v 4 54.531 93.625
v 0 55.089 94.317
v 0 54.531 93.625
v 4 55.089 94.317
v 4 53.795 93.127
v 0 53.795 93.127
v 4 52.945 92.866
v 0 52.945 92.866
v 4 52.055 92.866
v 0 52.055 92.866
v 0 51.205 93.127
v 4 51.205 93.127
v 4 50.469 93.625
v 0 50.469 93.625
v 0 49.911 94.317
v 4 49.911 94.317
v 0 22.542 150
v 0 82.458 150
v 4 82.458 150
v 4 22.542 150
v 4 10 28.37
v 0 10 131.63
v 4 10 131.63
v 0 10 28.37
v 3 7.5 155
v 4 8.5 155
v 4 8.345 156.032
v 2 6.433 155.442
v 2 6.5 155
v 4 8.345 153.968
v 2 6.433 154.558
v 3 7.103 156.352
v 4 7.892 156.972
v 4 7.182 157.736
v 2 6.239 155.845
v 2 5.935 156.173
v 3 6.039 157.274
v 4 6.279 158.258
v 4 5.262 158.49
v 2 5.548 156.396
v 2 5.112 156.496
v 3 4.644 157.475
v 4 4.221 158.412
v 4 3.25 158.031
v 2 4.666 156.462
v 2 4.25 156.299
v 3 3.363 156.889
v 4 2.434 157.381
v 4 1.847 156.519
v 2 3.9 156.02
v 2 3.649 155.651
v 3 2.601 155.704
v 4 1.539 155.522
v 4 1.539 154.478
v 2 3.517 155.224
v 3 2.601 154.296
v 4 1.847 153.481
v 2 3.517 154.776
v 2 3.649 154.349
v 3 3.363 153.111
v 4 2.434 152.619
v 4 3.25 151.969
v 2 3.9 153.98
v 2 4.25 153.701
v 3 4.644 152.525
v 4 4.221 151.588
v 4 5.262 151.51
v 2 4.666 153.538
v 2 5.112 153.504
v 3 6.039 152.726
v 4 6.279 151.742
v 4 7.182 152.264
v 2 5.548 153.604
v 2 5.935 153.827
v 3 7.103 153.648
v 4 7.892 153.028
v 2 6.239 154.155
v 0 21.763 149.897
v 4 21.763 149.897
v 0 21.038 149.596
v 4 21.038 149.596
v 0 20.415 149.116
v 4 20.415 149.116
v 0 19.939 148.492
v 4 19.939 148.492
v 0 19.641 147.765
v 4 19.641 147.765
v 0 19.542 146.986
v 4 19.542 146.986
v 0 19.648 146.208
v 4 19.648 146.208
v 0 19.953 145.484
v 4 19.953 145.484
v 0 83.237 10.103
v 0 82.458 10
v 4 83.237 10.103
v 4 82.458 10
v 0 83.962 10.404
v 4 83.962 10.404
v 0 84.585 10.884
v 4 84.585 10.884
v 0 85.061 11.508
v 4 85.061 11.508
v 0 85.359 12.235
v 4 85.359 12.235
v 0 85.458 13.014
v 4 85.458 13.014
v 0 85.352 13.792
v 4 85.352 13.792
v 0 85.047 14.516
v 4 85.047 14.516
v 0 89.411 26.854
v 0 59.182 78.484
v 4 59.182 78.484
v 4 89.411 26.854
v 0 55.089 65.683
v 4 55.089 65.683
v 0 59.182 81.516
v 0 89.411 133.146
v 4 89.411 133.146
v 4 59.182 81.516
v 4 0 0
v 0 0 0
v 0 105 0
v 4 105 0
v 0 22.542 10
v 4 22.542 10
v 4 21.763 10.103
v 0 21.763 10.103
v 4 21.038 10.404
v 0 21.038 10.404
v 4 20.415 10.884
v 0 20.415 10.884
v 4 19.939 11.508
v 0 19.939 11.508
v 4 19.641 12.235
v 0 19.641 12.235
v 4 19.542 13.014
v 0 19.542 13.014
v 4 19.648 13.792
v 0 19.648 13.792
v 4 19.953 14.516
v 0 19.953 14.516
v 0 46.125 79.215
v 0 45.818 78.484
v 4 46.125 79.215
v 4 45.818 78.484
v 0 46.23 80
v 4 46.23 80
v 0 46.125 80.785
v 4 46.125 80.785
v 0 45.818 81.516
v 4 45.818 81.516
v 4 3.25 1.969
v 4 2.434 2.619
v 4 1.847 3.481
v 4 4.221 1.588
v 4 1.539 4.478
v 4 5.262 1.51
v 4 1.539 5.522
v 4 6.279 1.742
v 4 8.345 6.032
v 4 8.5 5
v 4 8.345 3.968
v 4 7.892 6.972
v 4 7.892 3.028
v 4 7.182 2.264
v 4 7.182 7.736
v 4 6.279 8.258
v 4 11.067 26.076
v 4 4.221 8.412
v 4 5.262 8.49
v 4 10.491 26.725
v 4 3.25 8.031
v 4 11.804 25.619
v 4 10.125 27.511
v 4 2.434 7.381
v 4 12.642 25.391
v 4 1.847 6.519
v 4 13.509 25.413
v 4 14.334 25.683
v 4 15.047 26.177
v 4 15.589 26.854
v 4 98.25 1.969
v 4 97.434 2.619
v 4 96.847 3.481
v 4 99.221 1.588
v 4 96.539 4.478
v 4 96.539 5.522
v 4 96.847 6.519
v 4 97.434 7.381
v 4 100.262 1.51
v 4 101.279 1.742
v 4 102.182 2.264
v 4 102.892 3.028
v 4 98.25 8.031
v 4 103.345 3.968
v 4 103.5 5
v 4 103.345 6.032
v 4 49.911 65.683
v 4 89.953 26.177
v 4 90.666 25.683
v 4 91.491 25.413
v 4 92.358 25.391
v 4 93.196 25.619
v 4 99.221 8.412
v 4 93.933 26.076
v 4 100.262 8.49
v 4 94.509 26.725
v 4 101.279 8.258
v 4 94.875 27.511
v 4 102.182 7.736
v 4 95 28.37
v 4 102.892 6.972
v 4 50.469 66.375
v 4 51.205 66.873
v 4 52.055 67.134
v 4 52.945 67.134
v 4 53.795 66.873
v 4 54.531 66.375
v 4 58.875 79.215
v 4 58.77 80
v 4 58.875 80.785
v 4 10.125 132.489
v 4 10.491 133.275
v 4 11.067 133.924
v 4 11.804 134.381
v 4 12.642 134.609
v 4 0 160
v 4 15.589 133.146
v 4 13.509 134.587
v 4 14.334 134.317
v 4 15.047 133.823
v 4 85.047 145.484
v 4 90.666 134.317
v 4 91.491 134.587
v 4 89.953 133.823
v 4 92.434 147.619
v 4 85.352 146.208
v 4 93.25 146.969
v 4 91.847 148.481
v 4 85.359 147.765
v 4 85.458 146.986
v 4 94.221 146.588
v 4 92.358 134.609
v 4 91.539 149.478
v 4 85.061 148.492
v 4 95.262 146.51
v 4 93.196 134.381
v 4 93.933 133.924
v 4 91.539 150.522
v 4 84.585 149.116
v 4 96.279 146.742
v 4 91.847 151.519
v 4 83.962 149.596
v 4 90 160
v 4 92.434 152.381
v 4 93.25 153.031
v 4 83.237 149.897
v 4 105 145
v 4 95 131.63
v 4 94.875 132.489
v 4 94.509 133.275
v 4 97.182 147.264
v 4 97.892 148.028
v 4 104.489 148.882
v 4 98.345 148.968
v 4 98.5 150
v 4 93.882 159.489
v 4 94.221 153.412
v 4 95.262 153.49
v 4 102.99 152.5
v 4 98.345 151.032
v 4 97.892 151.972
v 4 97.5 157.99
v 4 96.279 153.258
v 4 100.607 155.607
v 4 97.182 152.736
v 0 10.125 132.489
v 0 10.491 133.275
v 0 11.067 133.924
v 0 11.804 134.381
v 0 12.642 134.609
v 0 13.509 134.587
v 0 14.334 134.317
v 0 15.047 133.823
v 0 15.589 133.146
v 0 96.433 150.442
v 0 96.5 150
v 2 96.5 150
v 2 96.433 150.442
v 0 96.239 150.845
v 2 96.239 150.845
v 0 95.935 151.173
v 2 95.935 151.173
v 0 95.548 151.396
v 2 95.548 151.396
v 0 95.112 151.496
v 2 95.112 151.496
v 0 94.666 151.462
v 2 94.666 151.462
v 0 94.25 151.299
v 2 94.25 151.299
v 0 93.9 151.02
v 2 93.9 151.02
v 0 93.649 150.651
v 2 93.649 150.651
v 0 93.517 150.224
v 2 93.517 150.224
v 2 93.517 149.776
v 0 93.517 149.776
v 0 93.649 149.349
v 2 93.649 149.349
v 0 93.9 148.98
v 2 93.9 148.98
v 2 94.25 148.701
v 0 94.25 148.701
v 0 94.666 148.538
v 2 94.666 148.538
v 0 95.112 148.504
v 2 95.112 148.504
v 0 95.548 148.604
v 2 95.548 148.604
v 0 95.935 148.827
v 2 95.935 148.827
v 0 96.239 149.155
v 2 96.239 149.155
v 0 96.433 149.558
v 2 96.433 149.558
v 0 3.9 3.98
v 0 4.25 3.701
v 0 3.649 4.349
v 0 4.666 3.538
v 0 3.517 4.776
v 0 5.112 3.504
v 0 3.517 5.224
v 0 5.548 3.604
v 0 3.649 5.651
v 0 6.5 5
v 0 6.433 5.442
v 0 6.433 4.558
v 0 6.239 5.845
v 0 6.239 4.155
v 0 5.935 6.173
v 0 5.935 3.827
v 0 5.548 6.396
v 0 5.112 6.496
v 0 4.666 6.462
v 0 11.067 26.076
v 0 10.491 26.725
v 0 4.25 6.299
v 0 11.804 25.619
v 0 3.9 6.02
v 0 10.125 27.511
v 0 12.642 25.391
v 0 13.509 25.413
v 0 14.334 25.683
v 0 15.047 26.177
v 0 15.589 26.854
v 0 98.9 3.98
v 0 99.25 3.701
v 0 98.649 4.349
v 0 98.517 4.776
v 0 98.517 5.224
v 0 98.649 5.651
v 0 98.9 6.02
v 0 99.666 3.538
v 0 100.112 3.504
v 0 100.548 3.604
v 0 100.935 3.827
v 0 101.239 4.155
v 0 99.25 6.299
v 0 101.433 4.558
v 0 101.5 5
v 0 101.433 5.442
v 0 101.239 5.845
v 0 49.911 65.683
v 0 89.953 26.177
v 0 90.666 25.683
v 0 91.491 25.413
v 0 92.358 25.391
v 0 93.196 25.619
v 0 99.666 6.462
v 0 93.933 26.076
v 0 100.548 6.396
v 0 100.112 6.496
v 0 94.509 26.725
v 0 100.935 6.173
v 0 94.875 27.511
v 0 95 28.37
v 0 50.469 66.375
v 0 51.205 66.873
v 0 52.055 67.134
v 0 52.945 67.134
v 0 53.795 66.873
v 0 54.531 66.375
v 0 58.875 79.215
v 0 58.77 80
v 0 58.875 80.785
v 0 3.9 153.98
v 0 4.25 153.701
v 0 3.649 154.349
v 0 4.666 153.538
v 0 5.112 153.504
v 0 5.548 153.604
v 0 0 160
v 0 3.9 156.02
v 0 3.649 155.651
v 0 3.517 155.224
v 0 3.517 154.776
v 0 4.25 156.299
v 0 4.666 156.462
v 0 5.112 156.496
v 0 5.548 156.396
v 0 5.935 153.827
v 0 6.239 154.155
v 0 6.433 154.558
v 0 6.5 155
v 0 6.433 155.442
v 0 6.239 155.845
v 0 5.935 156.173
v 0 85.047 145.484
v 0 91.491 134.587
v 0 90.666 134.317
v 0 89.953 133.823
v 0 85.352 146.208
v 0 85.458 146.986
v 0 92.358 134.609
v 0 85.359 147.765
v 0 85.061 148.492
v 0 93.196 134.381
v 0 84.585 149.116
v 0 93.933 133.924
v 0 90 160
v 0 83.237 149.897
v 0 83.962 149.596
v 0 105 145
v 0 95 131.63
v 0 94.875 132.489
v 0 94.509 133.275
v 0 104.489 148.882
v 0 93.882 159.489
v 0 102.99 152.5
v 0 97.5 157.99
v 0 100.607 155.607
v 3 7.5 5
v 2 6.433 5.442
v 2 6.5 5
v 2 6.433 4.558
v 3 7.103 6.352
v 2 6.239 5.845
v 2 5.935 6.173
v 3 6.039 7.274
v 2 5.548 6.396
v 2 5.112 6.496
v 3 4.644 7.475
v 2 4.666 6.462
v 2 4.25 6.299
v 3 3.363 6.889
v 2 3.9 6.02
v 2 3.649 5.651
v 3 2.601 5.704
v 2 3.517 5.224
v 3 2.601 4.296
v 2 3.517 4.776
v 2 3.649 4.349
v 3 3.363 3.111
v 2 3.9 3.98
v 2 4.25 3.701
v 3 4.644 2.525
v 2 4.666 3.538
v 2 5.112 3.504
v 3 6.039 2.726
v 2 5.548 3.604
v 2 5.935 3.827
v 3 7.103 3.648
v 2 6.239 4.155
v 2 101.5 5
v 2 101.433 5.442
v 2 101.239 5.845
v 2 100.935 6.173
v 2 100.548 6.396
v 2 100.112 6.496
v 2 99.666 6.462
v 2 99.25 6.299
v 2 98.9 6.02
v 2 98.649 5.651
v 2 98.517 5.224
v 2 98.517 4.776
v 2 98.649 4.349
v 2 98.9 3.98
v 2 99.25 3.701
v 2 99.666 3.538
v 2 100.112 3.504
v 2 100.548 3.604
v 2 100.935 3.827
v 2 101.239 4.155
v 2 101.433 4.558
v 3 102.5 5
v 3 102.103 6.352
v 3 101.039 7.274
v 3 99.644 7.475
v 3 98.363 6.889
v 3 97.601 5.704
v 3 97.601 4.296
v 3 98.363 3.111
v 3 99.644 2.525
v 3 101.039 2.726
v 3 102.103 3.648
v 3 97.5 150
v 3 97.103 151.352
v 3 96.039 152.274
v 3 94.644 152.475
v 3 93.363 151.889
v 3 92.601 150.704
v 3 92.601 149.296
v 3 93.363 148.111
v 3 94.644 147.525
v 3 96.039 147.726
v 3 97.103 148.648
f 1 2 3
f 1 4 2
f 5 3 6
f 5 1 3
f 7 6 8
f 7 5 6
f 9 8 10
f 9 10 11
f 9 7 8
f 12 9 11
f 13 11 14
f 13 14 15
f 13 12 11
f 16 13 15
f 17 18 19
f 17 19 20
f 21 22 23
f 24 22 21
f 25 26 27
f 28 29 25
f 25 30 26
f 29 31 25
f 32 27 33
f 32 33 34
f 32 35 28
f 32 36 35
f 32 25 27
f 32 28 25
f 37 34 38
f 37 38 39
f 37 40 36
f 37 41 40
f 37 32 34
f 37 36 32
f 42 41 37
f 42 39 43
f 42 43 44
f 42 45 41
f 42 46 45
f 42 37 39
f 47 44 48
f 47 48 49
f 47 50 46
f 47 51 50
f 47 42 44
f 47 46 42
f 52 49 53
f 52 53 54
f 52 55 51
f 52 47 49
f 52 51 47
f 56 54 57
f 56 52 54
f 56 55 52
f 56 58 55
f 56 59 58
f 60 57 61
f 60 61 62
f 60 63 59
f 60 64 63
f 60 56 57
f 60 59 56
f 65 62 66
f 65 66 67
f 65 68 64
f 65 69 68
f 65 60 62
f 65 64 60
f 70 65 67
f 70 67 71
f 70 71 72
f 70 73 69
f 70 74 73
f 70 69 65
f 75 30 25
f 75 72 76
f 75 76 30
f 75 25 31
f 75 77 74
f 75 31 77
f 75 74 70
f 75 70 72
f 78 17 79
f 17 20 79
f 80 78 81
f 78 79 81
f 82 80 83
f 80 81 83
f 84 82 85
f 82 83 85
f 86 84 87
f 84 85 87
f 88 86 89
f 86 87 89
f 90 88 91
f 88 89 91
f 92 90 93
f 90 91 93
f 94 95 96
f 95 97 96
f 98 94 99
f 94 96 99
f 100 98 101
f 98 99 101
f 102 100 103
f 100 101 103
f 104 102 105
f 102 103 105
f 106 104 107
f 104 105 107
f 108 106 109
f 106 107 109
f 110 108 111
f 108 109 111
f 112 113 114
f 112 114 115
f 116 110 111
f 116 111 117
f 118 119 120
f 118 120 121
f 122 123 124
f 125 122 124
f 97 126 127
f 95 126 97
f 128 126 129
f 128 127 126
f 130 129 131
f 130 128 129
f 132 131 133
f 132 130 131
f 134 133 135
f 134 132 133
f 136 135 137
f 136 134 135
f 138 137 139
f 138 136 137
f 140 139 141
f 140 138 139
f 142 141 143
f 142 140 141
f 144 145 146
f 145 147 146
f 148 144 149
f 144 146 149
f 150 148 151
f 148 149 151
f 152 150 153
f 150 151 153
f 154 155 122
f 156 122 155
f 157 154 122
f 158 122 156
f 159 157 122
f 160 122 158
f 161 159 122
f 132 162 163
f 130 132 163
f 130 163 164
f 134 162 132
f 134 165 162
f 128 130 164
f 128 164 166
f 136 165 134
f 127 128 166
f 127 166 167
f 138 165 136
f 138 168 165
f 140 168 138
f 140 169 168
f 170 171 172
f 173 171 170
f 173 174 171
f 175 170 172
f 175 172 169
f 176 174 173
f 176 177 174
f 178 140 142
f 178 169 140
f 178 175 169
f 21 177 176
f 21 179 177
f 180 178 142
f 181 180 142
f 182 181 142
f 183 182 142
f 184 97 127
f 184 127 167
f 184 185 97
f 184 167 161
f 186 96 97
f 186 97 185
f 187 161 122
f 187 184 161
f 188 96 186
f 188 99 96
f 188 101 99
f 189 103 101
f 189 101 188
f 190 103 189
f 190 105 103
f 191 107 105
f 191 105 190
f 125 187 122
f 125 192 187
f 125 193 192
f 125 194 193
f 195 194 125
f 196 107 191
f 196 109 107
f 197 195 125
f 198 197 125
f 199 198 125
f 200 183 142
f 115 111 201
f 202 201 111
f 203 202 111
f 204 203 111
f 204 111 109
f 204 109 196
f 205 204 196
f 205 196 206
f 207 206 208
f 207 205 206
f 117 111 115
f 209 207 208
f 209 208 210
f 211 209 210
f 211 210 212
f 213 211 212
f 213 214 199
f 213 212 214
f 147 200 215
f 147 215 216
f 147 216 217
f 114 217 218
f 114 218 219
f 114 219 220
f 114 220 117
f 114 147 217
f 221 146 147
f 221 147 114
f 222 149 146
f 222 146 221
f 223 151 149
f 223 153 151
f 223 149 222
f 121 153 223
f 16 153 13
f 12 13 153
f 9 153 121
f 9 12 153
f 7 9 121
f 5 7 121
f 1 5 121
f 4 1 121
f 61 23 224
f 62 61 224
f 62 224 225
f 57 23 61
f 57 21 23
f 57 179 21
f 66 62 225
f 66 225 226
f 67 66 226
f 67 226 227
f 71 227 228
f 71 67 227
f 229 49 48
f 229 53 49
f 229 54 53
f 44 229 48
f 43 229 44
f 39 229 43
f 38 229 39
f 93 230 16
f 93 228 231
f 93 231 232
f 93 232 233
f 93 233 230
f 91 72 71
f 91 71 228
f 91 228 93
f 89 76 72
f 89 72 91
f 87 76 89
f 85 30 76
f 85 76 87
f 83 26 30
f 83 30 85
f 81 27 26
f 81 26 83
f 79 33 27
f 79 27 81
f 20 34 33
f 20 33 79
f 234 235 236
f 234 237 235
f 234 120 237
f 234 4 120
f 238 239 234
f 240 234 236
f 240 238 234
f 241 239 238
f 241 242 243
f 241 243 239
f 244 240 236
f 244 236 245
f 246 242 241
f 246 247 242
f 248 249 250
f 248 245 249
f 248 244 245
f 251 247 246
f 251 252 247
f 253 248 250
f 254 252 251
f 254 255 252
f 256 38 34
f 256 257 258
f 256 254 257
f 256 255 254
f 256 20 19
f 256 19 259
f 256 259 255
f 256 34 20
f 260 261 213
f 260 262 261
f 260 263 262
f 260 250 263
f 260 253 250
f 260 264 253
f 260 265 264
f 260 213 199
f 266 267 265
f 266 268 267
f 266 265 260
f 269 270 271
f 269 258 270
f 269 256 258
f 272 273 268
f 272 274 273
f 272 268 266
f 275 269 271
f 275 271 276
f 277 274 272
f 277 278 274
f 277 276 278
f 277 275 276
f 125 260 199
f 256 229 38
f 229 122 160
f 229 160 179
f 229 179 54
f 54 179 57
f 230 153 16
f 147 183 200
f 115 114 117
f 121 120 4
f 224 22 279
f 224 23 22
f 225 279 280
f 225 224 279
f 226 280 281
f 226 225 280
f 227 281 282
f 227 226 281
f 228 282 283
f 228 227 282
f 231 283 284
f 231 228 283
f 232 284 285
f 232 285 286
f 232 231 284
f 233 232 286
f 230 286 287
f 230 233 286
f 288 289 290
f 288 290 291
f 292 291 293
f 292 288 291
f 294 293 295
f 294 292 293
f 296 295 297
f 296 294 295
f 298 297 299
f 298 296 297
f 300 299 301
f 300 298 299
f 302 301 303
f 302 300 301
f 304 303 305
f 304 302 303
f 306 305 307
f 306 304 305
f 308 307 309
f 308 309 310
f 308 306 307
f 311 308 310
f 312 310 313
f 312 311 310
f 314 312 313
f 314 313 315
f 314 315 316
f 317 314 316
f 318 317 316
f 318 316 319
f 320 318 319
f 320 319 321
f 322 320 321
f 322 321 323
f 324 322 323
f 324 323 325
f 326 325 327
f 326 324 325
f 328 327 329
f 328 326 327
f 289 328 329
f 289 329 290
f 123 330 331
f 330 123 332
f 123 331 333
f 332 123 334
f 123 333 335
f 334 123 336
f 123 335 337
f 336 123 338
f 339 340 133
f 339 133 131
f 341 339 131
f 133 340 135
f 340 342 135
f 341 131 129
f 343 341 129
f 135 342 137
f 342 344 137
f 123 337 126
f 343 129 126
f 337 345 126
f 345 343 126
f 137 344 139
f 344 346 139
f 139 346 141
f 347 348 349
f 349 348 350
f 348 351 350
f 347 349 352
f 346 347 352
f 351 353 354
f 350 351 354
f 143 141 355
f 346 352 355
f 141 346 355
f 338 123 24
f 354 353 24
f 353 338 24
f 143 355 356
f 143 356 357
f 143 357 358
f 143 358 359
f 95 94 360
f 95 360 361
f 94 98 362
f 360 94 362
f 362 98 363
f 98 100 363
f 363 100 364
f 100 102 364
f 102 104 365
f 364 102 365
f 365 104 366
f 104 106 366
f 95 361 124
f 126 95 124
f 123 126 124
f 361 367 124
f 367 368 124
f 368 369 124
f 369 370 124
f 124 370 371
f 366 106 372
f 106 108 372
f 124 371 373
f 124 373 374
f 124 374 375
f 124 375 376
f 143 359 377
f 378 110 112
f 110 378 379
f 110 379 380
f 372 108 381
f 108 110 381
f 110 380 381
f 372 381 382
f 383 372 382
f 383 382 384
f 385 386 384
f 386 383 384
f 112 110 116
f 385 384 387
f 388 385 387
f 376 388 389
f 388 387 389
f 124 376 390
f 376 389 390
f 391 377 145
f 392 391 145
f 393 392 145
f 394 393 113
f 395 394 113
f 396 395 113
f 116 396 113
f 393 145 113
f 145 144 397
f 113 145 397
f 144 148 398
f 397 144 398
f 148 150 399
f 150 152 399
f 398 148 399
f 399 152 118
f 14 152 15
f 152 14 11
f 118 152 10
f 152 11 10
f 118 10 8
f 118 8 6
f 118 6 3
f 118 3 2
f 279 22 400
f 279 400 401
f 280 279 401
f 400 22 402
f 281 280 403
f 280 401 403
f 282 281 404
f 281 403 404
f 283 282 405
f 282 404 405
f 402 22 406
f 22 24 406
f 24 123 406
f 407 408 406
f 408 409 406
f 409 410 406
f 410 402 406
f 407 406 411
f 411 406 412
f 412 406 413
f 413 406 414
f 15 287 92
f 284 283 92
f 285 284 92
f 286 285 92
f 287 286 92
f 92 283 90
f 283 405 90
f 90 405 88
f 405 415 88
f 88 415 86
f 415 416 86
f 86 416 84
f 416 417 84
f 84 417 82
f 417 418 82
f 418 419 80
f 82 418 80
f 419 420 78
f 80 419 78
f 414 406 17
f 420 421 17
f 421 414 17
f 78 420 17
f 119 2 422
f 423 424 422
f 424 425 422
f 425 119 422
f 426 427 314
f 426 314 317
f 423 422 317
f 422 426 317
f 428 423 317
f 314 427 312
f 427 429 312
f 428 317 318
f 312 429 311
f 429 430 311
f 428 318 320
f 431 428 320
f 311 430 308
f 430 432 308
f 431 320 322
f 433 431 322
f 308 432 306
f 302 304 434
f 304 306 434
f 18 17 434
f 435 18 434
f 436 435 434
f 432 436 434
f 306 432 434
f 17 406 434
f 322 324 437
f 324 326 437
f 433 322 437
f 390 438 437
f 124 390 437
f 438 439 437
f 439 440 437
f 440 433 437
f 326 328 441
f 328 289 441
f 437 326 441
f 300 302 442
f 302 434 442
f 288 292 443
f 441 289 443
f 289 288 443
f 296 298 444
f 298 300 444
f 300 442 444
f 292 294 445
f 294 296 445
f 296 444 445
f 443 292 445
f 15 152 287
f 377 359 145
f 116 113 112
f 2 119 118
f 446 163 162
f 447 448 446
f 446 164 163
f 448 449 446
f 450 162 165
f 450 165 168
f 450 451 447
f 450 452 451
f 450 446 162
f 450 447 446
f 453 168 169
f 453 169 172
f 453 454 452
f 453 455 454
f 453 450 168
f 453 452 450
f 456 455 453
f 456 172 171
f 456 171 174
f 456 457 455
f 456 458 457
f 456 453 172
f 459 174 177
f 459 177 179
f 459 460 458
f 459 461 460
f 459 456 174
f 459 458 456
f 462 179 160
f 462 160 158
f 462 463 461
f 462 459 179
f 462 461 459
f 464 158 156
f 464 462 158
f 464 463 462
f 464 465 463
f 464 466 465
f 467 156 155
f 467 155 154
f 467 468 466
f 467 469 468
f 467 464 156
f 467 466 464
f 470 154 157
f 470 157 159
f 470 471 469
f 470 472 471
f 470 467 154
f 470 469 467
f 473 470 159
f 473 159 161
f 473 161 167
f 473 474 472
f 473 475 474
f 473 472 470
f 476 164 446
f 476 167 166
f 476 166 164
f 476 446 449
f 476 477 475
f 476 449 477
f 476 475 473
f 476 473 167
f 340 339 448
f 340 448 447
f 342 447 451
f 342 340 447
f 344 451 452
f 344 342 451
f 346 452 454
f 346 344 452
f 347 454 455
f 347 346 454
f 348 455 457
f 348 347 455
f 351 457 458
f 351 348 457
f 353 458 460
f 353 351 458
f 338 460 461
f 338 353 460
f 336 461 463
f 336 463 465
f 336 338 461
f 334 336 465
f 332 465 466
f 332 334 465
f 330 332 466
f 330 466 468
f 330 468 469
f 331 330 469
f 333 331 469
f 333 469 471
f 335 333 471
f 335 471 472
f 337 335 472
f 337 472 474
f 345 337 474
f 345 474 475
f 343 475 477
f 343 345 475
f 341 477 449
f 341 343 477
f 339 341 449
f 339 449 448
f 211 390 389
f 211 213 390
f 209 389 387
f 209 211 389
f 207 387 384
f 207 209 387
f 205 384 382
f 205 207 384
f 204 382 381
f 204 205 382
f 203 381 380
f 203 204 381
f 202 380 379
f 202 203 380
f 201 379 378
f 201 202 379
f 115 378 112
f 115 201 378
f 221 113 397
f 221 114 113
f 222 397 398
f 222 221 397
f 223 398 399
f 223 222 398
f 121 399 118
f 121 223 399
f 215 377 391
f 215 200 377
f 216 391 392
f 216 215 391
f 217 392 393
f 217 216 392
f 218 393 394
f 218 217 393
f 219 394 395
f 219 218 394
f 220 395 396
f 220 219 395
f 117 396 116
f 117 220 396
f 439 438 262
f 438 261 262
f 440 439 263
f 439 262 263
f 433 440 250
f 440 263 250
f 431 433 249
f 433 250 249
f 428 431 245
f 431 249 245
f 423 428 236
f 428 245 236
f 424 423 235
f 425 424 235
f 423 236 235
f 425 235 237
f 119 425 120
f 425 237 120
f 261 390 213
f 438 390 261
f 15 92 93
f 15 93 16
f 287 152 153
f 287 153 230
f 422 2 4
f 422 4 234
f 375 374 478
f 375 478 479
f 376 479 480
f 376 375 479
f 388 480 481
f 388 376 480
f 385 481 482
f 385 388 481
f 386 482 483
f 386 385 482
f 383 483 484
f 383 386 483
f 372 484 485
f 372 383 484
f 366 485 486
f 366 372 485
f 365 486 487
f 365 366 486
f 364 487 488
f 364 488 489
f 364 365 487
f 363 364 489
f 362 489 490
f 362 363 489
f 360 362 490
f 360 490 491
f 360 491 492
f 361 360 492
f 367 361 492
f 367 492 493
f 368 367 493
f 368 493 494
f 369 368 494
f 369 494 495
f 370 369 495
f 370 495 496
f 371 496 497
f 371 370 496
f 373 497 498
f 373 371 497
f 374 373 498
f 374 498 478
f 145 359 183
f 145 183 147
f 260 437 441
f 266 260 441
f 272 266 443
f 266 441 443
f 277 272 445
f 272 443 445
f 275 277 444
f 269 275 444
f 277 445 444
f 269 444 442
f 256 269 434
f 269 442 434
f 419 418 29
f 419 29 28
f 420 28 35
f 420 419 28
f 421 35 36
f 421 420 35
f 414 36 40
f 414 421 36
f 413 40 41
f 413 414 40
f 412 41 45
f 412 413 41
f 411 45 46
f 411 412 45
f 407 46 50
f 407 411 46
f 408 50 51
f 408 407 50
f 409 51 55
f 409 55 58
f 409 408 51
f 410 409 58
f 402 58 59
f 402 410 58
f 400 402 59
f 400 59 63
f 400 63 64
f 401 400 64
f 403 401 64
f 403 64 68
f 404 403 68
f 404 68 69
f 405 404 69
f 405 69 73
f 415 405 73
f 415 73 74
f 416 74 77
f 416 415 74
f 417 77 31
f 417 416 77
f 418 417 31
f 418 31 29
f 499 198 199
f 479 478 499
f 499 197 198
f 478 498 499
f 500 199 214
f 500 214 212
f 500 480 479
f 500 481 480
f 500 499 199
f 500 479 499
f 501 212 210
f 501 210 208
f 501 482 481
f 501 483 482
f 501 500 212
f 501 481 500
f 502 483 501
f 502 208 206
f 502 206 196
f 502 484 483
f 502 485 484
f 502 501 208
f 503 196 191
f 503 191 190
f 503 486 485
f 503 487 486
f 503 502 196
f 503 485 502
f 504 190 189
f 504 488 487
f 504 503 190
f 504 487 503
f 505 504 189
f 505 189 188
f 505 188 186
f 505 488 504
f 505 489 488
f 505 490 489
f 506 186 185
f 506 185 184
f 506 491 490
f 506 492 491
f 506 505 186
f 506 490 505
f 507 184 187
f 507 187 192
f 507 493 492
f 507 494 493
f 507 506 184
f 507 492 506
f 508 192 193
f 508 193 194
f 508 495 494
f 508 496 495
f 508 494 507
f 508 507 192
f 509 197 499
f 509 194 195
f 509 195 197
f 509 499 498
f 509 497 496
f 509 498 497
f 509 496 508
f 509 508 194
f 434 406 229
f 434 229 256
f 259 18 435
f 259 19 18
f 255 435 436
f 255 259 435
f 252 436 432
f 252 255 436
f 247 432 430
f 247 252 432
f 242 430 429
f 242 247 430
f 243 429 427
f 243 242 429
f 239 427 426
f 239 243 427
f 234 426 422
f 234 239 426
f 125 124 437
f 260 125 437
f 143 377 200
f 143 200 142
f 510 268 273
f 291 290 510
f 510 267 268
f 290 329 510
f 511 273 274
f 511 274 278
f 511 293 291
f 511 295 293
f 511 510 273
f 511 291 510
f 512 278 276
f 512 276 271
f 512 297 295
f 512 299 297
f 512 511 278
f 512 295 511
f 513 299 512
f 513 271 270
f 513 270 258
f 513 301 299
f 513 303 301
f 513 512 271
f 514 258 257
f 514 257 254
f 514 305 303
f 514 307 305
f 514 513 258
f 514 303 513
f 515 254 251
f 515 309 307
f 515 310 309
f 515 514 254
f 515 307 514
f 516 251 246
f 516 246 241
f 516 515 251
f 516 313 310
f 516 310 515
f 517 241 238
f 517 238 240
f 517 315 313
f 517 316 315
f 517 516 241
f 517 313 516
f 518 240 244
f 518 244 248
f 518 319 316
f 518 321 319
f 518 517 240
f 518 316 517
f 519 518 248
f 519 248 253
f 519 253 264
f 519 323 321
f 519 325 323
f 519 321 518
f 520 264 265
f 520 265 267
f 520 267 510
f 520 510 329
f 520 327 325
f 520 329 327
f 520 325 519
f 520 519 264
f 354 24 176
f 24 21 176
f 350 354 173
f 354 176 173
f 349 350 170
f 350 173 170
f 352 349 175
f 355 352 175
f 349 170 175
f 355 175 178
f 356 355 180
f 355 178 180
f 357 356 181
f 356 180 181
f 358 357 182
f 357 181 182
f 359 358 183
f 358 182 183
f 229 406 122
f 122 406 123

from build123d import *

# Parameters (mm, degrees)
SKETCH_R     = 1.5
PAD_DEPTH    = 4
FILLET_R     = 3
CHAMFER_SIZE = 2


with BuildPart() as part:
    # Sketch → Pad (new body)
    with BuildSketch(Plane.YZ):
        with BuildLine():
            Line((0, 0), (105, 0))
            Line((105, 0), (105, 145))
            ThreePointArc((105, 145), (100.606602, 155.606602), (90, 160))
            Line((0, 160), (90, 160))
            Line((0, 160), (0, 0))
        make_face()
        with Locations((5, 155)):
            Circle(SKETCH_R, mode=Mode.SUBTRACT)
        with Locations((5, 5)):
            Circle(SKETCH_R, mode=Mode.SUBTRACT)
        with Locations((100, 5)):
            Circle(SKETCH_R, mode=Mode.SUBTRACT)
        with Locations((95, 150)):
            Circle(SKETCH_R, mode=Mode.SUBTRACT)
        Polygon((17.30871, 10), (87.69129, 10), (52.5, 70.104262), align=None, mode=Mode.SUBTRACT)
        Polygon((95, 17.30871), (95, 142.69129), (58.293995, 80), align=None, mode=Mode.SUBTRACT)
        Polygon((87.69129, 150), (17.30871, 150), (52.5, 89.895738), align=None, mode=Mode.SUBTRACT)
        Polygon((10, 142.69129), (10, 17.30871), (46.706005, 80), align=None, mode=Mode.SUBTRACT)
    extrude(amount=PAD_DEPTH)

    # Fillet
    fillet_edges = [part.edges().sort_by_distance(p)[0] for p in [
        (2, 52.5, 89.895738),
        (2, 58.293995, 80),
        (2, 52.5, 70.104262),
        (2, 46.706005, 80),
        (2, 17.30871, 150),
        (2, 87.69129, 150),
        (2, 10, 142.69129),
        (2, 95, 142.69129),
        (2, 10, 17.30871),
        (2, 17.30871, 10),
        (2, 95, 17.30871),
        (2, 87.69129, 10),
    ]]
    fillet(fillet_edges, radius=FILLET_R)

    # Chamfer
    chamfer_edges = [part.edges().sort_by_distance(p)[0] for p in [
        (4, 3.5, 155),
        (4, 93.5, 150),
        (4, 98.5, 5),
        (4, 3.5, 5),
    ]]
    chamfer(chamfer_edges, length=CHAMFER_SIZE)


solid = part.part
